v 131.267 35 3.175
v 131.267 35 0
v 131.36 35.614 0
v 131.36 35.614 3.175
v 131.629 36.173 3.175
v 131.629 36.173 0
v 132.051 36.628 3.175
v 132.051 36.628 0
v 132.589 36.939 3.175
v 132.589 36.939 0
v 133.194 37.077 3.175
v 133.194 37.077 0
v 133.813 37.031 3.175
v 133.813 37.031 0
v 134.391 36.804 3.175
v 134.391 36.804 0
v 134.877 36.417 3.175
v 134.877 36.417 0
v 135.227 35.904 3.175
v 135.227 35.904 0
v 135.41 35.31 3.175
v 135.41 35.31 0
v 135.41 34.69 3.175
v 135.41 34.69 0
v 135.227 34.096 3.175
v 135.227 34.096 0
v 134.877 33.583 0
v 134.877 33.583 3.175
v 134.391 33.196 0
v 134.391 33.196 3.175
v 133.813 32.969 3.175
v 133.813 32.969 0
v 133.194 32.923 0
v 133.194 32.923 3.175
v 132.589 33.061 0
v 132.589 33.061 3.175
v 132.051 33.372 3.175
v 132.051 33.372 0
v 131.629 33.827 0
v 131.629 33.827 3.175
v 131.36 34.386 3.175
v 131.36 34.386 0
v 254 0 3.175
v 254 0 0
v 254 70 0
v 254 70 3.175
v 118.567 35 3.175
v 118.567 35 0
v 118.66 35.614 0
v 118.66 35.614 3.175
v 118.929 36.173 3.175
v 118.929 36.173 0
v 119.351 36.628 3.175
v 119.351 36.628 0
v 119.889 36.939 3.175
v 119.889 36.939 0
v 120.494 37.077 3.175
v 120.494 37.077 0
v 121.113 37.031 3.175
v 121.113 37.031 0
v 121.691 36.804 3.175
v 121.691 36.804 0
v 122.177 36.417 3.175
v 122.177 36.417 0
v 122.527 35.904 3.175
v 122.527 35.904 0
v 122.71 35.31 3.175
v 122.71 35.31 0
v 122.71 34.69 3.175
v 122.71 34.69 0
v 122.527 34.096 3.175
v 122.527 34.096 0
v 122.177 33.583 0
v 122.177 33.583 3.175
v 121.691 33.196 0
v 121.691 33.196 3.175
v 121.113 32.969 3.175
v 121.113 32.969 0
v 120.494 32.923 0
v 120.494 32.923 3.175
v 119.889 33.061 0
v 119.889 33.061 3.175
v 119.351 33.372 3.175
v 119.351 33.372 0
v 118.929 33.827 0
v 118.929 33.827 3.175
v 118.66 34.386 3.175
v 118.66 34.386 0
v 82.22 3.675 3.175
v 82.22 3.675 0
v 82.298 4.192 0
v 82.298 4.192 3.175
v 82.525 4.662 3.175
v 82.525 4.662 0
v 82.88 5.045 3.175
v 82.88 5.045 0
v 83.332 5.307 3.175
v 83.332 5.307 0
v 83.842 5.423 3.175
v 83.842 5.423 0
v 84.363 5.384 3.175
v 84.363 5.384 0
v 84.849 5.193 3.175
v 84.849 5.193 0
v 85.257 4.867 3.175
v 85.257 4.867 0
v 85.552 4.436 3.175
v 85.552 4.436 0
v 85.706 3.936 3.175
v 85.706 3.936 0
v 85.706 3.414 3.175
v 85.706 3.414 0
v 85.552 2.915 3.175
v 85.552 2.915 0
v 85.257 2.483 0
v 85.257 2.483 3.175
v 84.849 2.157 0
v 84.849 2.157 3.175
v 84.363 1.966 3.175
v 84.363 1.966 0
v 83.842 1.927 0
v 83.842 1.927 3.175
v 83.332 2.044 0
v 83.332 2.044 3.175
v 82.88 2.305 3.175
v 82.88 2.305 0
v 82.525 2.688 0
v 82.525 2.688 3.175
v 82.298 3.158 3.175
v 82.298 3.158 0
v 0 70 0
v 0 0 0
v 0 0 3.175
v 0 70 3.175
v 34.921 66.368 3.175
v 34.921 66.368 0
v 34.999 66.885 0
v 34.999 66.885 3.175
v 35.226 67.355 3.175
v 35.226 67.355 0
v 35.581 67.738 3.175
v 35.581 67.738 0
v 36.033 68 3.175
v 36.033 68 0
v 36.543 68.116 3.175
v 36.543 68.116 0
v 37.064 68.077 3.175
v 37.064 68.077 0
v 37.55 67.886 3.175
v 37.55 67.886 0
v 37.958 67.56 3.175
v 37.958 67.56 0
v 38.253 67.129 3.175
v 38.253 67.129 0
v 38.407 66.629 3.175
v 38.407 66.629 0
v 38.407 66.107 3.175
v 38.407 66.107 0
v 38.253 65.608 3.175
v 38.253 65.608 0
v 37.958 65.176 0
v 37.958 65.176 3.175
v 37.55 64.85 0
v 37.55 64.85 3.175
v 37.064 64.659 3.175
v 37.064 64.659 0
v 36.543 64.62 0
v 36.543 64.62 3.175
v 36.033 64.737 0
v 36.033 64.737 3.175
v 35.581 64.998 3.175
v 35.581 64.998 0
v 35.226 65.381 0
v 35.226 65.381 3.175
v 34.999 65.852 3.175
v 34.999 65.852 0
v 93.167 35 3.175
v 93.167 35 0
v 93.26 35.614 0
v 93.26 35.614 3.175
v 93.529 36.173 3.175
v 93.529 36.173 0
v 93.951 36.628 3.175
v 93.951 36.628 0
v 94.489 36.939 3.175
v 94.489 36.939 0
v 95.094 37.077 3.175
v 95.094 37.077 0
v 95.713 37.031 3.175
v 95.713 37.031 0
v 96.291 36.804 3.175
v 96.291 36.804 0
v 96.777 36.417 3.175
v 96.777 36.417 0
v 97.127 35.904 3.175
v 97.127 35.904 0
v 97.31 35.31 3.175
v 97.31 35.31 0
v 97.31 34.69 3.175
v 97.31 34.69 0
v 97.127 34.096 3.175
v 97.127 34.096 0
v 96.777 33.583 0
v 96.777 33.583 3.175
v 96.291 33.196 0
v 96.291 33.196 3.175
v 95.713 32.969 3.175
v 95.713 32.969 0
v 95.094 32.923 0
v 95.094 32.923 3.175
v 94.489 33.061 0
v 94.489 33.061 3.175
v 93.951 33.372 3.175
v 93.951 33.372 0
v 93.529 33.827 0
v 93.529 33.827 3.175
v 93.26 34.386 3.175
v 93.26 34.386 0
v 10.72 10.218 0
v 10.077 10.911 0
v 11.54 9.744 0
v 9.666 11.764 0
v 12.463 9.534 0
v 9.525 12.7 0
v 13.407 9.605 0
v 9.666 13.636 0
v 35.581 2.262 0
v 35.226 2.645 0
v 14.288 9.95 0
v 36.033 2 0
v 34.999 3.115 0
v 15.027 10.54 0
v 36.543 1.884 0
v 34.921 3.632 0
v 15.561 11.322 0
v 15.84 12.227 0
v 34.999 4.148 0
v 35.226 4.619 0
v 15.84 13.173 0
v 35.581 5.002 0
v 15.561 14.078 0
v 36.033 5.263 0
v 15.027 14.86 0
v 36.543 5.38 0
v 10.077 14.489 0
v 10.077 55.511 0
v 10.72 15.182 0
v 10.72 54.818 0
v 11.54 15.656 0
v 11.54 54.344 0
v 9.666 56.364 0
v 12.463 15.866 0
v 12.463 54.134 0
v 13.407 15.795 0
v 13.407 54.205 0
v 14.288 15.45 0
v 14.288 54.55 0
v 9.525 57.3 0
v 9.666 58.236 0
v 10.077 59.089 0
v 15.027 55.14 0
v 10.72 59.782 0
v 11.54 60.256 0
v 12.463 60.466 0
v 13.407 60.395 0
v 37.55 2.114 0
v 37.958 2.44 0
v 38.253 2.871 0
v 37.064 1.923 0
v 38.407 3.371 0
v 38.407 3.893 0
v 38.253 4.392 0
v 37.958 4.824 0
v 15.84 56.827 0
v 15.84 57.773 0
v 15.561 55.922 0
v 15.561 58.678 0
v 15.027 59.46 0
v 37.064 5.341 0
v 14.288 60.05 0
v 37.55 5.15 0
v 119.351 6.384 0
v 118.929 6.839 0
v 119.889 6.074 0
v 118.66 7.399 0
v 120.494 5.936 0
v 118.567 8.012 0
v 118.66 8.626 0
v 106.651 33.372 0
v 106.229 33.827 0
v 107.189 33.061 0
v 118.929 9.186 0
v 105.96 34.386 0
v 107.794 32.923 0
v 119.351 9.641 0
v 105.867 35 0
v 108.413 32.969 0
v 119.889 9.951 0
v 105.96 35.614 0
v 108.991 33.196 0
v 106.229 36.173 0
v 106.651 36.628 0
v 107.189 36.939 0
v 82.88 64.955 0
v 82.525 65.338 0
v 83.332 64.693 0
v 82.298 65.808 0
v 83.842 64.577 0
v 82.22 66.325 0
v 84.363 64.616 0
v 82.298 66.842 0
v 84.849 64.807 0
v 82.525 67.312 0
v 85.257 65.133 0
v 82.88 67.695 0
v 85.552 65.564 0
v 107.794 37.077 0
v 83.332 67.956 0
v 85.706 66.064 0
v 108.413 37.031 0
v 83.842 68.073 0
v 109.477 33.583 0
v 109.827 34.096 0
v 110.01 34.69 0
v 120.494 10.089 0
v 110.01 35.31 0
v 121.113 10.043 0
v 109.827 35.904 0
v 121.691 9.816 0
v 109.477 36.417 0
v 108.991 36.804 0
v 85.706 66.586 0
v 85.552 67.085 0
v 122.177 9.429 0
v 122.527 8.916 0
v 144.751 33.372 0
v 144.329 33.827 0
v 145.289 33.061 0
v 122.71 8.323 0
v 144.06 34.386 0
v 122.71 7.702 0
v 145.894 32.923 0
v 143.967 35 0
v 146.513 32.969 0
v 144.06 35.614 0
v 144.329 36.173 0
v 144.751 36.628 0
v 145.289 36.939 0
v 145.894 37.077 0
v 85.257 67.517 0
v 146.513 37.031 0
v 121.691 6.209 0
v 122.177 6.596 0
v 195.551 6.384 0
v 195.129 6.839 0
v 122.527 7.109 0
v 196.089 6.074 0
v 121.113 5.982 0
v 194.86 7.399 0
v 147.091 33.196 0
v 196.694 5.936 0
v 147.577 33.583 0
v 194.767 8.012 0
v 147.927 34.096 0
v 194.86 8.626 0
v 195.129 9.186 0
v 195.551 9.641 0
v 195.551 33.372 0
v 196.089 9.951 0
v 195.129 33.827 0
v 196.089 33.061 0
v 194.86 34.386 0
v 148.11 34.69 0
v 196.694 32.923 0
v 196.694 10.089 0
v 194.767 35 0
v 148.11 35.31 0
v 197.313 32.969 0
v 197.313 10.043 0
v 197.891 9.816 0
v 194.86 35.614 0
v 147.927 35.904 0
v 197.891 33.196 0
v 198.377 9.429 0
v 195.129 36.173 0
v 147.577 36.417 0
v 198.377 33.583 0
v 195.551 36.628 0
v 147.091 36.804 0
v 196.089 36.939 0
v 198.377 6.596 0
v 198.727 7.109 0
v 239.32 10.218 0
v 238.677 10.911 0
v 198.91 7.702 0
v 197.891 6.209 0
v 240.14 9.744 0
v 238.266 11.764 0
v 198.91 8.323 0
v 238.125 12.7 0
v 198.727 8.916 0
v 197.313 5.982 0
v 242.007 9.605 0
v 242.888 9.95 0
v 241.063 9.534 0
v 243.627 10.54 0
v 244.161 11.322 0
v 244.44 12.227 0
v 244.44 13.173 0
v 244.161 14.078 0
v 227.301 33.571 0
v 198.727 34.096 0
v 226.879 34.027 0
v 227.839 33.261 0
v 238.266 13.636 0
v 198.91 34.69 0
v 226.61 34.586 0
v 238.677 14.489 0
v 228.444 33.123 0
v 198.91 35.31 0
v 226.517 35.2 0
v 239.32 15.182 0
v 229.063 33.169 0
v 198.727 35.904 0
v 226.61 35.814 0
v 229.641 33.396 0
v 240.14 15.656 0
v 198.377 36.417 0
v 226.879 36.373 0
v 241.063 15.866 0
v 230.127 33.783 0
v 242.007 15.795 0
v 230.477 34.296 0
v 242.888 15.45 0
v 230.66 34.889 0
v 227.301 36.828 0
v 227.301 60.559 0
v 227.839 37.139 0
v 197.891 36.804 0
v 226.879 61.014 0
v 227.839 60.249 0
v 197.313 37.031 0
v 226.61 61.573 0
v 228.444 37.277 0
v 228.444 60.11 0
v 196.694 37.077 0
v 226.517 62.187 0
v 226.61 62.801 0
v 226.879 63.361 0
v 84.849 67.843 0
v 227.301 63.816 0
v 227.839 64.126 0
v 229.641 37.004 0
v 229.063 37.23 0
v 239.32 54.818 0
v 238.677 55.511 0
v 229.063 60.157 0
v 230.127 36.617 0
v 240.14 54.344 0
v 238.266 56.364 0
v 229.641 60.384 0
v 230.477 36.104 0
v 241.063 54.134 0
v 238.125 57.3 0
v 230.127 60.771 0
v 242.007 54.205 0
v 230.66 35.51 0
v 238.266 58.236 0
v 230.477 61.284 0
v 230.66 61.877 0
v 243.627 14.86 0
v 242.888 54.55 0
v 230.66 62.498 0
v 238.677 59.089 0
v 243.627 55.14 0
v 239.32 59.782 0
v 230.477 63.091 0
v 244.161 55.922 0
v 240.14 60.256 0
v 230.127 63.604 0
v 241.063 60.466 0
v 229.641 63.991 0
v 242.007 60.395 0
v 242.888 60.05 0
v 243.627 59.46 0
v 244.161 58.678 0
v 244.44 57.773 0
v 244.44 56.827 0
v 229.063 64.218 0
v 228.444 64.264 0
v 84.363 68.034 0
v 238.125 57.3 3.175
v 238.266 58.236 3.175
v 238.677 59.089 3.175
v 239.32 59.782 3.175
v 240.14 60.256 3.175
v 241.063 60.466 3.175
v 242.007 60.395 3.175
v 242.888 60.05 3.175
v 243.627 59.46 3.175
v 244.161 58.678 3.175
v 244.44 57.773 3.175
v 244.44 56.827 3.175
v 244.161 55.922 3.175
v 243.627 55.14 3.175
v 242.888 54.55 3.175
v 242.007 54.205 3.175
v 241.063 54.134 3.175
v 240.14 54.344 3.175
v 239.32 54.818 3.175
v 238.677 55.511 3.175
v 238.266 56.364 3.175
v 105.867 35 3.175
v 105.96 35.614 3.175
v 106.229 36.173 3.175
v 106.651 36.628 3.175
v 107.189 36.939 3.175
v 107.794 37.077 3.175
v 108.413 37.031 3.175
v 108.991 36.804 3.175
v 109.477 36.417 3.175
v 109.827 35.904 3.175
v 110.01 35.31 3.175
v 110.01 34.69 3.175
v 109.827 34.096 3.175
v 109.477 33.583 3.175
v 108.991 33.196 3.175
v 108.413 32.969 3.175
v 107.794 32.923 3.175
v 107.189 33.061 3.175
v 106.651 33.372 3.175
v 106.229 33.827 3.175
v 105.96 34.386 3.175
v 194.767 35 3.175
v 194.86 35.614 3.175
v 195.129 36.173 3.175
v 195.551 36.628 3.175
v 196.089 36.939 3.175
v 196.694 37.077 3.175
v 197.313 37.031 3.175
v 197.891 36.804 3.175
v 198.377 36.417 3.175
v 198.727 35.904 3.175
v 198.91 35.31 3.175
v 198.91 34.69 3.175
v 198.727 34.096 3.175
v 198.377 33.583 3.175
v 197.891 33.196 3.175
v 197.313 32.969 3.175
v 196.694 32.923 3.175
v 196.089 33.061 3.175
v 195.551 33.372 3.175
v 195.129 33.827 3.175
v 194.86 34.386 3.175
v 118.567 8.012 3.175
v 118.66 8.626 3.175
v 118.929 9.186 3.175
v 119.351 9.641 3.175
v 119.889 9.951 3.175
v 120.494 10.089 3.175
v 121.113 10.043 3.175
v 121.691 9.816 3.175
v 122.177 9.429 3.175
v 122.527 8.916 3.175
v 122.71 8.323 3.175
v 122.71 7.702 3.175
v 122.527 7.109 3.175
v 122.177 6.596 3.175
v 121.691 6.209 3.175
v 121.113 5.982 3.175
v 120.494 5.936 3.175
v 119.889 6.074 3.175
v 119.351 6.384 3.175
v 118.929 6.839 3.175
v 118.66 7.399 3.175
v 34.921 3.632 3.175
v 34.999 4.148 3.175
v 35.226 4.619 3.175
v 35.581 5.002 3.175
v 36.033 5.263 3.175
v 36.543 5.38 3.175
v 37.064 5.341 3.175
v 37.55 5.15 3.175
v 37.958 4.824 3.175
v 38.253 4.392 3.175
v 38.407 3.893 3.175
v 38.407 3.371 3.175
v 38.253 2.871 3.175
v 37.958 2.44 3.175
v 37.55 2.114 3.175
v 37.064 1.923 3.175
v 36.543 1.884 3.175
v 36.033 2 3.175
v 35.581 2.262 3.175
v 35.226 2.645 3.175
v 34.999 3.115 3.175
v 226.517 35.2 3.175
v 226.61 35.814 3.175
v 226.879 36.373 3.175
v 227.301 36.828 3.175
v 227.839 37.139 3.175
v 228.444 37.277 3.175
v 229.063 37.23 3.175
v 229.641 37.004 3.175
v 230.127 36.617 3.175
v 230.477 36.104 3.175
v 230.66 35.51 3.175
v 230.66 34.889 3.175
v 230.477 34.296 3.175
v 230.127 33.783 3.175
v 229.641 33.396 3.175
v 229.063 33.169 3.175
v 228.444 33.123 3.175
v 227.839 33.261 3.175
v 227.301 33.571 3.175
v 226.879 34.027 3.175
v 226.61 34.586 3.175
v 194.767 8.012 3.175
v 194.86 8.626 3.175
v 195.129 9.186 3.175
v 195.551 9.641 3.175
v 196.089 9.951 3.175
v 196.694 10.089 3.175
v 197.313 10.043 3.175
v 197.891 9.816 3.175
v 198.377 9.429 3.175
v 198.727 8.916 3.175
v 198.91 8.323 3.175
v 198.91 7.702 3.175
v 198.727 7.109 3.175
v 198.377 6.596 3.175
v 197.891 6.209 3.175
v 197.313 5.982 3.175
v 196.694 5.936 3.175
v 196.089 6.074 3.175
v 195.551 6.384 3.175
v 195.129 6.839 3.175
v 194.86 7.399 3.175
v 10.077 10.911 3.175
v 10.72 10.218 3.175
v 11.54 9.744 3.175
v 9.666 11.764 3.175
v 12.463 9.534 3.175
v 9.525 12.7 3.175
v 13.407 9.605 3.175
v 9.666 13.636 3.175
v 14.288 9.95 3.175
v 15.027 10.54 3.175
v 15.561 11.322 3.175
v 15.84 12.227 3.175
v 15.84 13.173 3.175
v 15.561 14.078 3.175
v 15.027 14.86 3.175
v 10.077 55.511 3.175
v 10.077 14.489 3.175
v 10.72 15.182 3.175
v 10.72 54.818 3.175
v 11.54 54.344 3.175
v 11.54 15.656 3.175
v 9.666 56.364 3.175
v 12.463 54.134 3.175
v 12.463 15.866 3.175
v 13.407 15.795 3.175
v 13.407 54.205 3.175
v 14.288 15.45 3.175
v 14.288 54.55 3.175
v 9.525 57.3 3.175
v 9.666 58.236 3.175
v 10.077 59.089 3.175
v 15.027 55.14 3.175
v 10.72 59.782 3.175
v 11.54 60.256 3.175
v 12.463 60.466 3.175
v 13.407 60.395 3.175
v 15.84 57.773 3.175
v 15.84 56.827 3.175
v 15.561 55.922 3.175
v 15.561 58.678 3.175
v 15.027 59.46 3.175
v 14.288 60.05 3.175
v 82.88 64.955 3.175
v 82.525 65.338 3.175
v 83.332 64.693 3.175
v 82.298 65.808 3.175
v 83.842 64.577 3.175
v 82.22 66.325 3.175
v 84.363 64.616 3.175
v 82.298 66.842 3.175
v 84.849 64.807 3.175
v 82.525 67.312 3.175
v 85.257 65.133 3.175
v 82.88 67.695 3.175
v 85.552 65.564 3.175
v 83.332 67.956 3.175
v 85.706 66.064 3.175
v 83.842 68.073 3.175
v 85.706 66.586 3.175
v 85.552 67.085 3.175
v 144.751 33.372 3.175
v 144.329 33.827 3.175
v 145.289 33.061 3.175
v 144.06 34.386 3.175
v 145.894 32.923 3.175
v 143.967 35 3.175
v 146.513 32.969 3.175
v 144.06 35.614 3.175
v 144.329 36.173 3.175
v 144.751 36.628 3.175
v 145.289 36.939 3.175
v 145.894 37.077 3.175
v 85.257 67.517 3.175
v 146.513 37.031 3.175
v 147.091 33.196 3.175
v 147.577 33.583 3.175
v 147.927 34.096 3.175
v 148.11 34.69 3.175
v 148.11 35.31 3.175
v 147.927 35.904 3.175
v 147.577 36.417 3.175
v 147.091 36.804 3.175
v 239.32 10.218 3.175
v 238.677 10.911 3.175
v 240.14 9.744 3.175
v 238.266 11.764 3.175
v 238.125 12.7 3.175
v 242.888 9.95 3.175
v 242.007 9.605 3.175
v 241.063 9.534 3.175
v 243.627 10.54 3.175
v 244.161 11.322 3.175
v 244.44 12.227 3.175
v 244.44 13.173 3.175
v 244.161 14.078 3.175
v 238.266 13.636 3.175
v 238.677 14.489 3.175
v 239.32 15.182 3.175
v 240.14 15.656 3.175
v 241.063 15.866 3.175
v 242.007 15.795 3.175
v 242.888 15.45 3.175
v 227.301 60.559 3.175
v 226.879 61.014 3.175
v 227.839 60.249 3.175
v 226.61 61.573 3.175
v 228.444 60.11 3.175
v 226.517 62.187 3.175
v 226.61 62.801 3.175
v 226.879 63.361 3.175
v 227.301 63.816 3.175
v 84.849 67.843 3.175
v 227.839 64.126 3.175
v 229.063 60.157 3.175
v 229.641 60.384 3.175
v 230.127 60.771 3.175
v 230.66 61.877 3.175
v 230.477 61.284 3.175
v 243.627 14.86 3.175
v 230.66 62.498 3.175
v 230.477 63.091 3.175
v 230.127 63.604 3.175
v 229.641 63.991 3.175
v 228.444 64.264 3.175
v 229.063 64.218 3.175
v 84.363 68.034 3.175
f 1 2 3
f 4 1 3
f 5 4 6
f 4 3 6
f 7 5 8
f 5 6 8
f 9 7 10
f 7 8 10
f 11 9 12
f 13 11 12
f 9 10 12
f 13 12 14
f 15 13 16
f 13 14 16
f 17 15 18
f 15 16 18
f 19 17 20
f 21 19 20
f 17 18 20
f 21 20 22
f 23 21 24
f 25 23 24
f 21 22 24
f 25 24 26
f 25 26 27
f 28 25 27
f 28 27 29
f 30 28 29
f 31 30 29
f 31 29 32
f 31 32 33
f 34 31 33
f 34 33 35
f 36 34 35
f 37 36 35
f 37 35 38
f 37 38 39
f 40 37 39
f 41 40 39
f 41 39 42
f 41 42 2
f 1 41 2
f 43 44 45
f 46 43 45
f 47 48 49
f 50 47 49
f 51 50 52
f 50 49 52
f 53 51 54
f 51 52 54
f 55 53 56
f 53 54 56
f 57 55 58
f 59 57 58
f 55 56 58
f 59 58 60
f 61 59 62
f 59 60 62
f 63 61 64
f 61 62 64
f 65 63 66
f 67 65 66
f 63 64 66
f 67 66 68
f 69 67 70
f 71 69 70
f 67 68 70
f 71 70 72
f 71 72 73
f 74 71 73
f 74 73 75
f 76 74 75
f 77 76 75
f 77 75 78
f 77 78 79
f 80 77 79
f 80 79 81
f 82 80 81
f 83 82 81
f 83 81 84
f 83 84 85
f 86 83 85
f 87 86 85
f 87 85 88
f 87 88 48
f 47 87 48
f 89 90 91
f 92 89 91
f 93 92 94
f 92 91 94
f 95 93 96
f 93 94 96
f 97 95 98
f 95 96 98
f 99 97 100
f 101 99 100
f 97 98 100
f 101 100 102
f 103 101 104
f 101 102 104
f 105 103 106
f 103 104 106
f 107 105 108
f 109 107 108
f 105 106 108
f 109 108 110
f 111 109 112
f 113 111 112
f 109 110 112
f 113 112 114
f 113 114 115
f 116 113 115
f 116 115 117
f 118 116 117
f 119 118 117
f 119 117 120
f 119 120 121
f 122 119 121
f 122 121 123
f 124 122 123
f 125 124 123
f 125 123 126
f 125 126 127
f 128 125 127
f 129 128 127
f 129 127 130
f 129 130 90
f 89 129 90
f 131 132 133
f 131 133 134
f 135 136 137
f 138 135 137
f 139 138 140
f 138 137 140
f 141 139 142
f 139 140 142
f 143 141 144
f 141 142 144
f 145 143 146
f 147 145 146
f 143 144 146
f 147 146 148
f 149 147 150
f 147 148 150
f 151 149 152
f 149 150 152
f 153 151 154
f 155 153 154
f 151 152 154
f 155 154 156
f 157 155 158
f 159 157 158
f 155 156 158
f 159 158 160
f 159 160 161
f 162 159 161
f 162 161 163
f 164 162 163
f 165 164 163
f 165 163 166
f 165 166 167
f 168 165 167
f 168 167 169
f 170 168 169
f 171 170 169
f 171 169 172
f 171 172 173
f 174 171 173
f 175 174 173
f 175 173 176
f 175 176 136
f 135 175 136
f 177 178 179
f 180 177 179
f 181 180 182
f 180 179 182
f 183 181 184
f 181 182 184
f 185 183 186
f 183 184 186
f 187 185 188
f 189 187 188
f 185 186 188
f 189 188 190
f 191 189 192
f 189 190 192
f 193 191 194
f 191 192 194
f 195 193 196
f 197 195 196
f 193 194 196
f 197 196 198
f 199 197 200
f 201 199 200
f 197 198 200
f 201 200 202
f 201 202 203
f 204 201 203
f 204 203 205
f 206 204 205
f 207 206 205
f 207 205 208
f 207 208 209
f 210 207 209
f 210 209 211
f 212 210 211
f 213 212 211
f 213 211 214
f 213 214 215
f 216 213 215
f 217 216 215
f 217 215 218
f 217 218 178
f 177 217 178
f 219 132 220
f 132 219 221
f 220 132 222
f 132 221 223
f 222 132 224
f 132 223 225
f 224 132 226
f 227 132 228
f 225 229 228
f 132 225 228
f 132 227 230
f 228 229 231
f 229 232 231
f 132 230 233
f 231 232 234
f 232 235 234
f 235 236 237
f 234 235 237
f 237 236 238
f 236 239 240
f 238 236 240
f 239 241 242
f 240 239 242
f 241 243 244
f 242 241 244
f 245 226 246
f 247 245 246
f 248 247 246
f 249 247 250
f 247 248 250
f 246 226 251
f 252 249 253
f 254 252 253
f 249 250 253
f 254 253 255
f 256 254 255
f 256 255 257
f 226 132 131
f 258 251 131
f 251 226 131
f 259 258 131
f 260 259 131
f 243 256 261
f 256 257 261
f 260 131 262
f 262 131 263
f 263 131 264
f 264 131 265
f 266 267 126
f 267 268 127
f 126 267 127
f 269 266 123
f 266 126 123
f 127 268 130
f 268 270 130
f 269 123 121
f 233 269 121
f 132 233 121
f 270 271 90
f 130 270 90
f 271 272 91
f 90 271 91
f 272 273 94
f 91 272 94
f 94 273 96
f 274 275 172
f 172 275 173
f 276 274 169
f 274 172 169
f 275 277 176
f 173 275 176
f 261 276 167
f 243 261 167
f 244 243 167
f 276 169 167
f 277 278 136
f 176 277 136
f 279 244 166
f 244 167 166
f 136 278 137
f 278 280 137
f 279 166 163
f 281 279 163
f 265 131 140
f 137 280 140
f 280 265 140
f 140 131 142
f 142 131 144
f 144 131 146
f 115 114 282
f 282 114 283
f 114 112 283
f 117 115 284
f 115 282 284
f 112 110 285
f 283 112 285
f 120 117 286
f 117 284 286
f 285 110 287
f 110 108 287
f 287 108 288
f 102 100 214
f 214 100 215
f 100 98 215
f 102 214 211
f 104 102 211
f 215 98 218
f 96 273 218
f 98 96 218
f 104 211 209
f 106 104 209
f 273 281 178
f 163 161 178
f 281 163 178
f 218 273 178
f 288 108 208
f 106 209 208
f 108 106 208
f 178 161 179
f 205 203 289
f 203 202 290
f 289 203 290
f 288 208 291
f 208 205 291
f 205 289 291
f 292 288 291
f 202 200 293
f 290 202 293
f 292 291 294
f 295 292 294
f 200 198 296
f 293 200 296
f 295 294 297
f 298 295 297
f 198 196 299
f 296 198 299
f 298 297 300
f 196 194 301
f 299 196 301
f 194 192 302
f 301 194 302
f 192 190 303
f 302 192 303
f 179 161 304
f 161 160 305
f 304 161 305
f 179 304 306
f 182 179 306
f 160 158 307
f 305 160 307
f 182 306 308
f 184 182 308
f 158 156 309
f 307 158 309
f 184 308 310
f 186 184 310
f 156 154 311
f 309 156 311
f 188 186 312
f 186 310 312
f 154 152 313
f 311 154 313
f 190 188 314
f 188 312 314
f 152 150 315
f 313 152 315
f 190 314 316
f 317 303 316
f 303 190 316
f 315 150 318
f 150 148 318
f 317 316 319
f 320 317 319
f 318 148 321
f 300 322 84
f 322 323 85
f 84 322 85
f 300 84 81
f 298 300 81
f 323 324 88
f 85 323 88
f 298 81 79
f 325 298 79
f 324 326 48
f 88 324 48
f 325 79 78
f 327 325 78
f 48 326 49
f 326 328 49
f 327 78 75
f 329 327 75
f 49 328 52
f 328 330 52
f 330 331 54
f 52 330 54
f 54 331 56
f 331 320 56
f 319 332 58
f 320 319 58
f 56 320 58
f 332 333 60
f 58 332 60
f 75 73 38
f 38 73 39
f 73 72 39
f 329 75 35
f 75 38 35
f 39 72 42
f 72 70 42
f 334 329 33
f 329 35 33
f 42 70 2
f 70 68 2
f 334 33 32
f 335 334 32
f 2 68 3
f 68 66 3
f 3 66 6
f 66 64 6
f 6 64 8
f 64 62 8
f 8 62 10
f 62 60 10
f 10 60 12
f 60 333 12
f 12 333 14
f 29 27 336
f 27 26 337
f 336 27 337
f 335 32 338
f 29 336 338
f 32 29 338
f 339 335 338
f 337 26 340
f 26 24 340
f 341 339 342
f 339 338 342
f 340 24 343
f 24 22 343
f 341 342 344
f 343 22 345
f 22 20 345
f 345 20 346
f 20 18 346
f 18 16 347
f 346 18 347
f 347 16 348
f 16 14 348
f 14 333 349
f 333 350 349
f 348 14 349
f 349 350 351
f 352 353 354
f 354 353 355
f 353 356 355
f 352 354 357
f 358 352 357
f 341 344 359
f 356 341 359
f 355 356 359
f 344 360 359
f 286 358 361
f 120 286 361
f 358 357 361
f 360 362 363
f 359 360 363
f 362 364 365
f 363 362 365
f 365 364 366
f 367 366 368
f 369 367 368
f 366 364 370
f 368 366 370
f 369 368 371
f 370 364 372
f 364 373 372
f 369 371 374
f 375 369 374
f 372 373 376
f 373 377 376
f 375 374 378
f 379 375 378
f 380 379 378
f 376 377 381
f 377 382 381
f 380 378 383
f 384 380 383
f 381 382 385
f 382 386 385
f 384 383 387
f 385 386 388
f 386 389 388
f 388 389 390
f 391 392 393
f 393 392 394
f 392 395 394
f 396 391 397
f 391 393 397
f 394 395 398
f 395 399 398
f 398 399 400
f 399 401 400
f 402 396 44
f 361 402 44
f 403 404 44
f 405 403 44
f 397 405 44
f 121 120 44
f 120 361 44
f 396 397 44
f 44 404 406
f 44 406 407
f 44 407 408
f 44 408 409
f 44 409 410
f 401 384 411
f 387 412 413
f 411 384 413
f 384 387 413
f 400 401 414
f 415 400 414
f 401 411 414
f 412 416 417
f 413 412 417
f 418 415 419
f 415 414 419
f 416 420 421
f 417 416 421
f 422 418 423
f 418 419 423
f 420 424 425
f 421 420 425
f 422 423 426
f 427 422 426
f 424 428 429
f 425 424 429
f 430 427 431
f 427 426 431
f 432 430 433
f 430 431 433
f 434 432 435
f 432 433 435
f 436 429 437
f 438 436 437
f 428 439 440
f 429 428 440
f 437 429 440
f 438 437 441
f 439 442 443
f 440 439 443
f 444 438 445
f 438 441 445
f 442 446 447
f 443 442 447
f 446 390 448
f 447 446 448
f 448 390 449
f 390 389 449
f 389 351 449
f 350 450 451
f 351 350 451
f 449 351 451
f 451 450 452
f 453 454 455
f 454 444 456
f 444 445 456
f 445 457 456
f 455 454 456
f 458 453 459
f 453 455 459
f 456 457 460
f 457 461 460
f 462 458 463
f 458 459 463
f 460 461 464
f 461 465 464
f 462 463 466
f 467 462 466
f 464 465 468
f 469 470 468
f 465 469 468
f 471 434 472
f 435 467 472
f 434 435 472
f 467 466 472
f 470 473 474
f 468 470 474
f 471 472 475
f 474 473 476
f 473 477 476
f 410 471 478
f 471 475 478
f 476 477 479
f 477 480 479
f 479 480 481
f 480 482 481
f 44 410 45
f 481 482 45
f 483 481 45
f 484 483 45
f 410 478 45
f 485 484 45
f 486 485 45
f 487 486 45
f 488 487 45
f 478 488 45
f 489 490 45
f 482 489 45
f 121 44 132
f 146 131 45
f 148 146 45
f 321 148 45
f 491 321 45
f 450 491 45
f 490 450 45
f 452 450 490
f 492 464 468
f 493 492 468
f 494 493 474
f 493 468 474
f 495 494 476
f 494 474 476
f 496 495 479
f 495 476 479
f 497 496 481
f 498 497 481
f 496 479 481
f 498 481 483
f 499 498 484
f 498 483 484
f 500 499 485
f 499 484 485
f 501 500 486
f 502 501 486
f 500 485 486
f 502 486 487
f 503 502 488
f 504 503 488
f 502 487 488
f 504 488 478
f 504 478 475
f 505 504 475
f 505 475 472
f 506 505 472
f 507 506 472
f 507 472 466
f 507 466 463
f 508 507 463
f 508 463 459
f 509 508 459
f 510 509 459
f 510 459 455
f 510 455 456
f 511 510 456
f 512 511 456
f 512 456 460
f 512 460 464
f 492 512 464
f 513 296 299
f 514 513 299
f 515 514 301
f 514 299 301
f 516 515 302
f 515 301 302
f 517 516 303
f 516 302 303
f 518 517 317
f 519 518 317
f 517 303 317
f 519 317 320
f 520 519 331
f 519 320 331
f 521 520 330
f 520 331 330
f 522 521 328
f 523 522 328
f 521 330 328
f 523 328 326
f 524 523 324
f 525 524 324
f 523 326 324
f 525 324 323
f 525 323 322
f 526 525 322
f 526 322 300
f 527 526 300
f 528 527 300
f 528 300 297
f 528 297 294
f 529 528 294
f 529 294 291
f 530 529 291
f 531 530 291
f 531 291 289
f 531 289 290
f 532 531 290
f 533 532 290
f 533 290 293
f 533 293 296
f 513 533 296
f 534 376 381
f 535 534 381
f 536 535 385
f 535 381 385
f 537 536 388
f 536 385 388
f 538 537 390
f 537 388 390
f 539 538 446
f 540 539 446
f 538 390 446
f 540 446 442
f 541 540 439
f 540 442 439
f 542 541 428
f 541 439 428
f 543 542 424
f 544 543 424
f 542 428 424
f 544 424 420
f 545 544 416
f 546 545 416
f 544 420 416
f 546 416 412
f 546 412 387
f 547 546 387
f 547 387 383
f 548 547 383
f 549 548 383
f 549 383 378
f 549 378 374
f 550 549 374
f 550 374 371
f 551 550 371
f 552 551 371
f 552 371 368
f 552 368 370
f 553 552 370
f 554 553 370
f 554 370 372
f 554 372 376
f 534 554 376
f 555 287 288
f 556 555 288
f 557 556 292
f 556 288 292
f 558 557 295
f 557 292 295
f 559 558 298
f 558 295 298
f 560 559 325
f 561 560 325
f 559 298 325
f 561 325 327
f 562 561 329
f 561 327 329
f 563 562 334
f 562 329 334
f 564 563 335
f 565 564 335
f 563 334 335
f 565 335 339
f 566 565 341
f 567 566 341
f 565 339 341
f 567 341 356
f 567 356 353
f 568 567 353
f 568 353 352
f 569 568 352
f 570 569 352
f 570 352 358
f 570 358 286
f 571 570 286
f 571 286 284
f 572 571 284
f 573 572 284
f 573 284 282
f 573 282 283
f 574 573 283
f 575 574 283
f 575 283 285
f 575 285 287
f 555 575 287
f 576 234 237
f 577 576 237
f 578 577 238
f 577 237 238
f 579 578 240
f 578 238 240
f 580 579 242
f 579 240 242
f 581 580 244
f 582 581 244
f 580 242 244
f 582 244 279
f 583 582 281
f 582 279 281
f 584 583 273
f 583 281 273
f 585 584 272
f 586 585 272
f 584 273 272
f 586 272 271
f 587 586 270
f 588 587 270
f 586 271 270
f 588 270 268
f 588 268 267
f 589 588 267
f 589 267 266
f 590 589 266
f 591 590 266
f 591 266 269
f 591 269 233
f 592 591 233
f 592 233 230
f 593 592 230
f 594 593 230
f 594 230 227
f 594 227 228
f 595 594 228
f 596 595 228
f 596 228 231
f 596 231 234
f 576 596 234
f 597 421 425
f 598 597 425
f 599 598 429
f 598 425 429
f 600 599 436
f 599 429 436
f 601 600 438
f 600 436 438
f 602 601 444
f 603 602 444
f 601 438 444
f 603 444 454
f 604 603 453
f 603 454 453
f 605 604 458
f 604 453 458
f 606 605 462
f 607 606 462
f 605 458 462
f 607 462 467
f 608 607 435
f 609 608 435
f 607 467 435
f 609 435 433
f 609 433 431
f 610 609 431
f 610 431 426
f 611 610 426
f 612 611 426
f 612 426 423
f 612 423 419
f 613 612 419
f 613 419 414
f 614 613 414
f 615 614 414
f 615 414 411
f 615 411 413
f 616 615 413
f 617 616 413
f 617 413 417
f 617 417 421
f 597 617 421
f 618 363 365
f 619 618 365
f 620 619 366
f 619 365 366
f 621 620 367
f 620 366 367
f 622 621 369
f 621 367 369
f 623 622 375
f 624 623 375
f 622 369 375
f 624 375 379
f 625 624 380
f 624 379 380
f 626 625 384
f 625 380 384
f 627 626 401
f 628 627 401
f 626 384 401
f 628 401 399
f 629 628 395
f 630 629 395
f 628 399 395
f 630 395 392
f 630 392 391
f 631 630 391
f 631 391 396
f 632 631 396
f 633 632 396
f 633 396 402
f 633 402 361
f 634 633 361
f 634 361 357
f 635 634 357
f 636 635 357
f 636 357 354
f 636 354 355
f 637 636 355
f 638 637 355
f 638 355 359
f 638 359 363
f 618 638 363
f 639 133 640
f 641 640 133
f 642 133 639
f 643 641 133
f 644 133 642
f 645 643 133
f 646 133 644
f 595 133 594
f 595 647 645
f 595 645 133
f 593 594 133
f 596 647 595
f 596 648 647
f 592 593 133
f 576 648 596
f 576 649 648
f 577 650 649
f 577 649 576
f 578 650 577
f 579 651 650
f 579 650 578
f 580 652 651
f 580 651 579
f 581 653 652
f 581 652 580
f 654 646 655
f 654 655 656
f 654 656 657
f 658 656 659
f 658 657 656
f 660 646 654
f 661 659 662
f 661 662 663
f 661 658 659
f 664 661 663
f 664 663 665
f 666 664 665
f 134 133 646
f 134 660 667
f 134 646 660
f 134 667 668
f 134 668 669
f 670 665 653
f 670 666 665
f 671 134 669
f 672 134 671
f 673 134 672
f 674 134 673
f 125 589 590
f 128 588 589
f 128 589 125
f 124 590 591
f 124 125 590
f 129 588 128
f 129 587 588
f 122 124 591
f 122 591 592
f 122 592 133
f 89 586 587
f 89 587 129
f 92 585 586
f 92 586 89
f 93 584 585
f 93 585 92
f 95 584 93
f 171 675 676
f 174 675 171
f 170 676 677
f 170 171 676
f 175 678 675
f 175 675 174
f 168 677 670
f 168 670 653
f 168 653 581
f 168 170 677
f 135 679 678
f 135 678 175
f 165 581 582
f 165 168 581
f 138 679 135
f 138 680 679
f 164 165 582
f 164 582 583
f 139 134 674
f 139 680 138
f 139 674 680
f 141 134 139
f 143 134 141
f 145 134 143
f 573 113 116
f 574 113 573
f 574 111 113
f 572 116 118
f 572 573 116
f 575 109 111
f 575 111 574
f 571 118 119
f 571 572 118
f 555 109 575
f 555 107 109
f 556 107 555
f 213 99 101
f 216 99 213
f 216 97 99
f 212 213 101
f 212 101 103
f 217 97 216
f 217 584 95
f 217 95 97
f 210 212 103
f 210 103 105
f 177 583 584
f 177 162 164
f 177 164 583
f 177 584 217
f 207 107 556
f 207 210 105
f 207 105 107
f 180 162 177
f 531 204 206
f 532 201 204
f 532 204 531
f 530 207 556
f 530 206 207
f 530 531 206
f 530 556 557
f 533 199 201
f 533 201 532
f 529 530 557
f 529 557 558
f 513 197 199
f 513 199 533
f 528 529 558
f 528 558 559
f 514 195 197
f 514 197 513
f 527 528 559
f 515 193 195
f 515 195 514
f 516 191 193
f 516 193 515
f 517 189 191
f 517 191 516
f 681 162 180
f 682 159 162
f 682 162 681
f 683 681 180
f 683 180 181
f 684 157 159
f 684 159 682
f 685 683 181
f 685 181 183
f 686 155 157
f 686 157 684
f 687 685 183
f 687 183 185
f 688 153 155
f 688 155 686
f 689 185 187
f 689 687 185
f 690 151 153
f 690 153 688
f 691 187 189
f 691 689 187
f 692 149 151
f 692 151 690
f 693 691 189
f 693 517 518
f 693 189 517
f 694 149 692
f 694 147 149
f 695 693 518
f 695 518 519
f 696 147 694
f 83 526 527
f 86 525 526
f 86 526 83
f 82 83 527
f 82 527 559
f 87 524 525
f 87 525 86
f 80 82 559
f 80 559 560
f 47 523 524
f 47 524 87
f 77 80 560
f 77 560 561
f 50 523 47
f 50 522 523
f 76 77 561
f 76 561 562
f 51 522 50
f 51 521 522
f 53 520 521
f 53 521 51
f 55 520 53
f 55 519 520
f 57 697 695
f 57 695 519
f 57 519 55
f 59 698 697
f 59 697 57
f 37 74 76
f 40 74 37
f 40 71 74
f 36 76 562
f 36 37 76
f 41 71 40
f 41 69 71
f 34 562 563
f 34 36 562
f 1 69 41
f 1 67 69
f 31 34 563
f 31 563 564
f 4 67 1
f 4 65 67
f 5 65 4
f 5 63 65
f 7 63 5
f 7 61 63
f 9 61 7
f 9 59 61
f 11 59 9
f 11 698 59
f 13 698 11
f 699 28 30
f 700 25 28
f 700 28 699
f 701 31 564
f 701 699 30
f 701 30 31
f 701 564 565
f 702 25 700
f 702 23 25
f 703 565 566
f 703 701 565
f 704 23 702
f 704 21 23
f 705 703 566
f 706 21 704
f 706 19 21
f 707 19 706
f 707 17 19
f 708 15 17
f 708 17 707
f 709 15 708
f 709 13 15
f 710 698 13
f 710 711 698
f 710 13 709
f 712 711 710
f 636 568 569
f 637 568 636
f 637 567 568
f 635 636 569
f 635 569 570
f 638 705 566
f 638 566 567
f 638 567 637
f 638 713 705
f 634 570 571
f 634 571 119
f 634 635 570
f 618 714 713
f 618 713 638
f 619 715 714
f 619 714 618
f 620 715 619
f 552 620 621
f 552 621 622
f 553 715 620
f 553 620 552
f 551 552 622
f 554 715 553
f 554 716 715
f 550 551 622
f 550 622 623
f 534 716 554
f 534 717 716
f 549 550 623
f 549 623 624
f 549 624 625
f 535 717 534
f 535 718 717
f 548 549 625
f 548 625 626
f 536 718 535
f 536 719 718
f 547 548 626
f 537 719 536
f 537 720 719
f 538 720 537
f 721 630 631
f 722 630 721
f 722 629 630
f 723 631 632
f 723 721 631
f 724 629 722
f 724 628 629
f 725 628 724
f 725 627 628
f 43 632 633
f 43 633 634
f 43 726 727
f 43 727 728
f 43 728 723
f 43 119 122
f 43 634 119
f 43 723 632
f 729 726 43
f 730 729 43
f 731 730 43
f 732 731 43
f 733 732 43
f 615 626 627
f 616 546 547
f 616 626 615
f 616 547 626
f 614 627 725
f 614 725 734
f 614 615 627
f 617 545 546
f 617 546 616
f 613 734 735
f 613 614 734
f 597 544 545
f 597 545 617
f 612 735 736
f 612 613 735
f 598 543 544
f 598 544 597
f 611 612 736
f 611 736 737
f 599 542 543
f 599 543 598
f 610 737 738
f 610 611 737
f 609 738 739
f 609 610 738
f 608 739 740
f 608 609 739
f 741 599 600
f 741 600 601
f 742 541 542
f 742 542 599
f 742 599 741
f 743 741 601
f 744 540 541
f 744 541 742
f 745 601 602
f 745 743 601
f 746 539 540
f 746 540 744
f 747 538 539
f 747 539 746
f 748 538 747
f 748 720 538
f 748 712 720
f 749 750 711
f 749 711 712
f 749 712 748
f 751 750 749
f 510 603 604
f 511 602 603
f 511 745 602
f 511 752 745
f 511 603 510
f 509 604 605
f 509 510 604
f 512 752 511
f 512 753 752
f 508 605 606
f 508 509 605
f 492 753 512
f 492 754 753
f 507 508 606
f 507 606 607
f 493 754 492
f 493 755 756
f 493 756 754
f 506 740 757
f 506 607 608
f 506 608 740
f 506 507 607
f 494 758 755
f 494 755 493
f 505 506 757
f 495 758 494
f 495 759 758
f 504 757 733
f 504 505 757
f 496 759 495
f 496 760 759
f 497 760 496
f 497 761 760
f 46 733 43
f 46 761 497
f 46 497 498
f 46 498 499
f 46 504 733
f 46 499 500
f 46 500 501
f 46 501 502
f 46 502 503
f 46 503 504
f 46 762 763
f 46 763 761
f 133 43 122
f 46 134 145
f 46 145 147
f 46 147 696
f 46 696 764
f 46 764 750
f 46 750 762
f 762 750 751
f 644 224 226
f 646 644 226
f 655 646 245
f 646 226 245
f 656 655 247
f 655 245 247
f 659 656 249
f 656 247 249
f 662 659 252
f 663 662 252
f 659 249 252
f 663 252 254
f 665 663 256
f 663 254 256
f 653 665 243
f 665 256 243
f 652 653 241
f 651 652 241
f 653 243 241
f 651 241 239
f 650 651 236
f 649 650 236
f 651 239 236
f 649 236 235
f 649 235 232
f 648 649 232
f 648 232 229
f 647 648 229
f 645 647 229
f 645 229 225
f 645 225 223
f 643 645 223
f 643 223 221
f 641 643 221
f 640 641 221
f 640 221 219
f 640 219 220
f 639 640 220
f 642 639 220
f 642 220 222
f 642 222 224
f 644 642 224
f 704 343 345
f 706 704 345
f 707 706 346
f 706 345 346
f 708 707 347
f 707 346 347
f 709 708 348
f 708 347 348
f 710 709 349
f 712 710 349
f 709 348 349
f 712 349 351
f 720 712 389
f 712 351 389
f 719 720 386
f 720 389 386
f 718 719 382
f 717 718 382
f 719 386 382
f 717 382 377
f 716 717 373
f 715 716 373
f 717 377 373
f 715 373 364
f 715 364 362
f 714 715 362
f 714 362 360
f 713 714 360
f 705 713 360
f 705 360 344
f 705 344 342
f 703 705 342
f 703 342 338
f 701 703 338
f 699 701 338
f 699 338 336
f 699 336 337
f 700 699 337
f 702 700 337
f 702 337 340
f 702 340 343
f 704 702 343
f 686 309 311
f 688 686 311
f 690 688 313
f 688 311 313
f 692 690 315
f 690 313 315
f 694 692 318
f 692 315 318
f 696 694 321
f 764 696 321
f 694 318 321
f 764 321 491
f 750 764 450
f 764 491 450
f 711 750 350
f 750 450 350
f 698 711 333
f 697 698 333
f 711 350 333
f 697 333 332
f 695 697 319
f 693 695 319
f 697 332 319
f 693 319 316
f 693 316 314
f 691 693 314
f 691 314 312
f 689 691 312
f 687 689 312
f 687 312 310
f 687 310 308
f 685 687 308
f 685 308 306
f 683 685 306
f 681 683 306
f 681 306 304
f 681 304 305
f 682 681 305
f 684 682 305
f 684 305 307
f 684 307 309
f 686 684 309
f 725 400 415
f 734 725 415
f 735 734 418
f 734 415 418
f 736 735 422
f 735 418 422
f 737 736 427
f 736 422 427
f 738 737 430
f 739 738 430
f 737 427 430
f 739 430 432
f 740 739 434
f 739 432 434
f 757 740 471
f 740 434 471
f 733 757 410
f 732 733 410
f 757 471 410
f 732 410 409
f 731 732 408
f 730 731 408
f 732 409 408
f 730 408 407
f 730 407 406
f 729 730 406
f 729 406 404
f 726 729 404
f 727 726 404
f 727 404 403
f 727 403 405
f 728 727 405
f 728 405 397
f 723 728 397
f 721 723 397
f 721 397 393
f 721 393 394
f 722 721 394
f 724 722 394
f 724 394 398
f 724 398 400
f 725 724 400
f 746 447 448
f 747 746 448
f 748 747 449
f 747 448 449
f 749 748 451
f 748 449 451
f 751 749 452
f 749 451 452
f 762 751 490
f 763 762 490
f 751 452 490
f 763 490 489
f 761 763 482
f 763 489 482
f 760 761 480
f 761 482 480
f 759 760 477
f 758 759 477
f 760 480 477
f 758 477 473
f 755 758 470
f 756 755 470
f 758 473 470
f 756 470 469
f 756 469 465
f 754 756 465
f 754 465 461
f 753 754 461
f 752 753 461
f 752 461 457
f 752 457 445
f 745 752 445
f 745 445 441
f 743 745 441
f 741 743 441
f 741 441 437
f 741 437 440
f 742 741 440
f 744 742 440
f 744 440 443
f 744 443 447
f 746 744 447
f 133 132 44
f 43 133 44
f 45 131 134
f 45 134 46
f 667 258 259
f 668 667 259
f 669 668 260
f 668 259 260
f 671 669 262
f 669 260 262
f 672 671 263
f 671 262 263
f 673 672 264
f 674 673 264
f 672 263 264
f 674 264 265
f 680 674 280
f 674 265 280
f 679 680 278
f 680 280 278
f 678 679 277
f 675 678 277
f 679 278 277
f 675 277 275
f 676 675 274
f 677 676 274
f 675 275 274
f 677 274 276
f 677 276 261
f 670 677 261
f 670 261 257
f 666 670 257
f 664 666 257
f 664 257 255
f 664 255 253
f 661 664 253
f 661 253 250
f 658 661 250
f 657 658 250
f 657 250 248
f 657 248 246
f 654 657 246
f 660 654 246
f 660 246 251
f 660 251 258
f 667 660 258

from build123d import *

# Parameters (mm, degrees)
SKETCH1_W               = 254
SKETCH1_H               = 70
BOSS_EXTRUDE1_DEPTH     = 3.175
F_8_32_TAPPED_HOLE1_D   = 4.1656
F_6_32_TAPPED_HOLE1_D   = 3.5052
F_1_4_20_TAPPED_HOLE1_D = 6.35
F_8_32_TAPPED_HOLE2_D   = 4.1656


with BuildPart() as part:
    # Sketch1 → Boss-Extrude1 (new body)
    with BuildSketch(Plane.XY):
        with Locations((127, 35)):
            Rectangle(SKETCH1_W, SKETCH1_H)
    extrude(amount=BOSS_EXTRUDE1_DEPTH)

    # #8-32 Tapped Hole1 (through all)
    with Locations(Plane.XY.offset(3.175)):
        with Locations((228.6, 62.187398), (196.85, 35), (95.25, 35), (120.65, 35), (146.05, 35), (133.35, 35), (107.95, 35)):
            Hole(F_8_32_TAPPED_HOLE1_D / 2)

    # #6-32 Tapped Hole1 (through all)
    with Locations(Plane.XY.offset(3.175)):
        with Locations((36.673632472, 66.368109228), (83.972588612, 66.324919192), (83.972588612, 3.675080808), (36.673632472, 3.631890772)):
            Hole(F_6_32_TAPPED_HOLE1_D / 2)

    # 1/4-20 Tapped Hole1 (through all)
    with Locations(Plane.XY.offset(3.175)):
        with Locations((12.7, 57.3), (241.3, 12.7), (241.3, 57.3), (12.7, 12.7)):
            Hole(F_1_4_20_TAPPED_HOLE1_D / 2)

    # #8-32 Tapped Hole2 (through all)
    with Locations(Plane.XY.offset(3.175)):
        with Locations((228.6, 35.199898), (196.85, 8.0125), (120.65, 8.0125)):
            Hole(F_8_32_TAPPED_HOLE2_D / 2)


solid = part.part
